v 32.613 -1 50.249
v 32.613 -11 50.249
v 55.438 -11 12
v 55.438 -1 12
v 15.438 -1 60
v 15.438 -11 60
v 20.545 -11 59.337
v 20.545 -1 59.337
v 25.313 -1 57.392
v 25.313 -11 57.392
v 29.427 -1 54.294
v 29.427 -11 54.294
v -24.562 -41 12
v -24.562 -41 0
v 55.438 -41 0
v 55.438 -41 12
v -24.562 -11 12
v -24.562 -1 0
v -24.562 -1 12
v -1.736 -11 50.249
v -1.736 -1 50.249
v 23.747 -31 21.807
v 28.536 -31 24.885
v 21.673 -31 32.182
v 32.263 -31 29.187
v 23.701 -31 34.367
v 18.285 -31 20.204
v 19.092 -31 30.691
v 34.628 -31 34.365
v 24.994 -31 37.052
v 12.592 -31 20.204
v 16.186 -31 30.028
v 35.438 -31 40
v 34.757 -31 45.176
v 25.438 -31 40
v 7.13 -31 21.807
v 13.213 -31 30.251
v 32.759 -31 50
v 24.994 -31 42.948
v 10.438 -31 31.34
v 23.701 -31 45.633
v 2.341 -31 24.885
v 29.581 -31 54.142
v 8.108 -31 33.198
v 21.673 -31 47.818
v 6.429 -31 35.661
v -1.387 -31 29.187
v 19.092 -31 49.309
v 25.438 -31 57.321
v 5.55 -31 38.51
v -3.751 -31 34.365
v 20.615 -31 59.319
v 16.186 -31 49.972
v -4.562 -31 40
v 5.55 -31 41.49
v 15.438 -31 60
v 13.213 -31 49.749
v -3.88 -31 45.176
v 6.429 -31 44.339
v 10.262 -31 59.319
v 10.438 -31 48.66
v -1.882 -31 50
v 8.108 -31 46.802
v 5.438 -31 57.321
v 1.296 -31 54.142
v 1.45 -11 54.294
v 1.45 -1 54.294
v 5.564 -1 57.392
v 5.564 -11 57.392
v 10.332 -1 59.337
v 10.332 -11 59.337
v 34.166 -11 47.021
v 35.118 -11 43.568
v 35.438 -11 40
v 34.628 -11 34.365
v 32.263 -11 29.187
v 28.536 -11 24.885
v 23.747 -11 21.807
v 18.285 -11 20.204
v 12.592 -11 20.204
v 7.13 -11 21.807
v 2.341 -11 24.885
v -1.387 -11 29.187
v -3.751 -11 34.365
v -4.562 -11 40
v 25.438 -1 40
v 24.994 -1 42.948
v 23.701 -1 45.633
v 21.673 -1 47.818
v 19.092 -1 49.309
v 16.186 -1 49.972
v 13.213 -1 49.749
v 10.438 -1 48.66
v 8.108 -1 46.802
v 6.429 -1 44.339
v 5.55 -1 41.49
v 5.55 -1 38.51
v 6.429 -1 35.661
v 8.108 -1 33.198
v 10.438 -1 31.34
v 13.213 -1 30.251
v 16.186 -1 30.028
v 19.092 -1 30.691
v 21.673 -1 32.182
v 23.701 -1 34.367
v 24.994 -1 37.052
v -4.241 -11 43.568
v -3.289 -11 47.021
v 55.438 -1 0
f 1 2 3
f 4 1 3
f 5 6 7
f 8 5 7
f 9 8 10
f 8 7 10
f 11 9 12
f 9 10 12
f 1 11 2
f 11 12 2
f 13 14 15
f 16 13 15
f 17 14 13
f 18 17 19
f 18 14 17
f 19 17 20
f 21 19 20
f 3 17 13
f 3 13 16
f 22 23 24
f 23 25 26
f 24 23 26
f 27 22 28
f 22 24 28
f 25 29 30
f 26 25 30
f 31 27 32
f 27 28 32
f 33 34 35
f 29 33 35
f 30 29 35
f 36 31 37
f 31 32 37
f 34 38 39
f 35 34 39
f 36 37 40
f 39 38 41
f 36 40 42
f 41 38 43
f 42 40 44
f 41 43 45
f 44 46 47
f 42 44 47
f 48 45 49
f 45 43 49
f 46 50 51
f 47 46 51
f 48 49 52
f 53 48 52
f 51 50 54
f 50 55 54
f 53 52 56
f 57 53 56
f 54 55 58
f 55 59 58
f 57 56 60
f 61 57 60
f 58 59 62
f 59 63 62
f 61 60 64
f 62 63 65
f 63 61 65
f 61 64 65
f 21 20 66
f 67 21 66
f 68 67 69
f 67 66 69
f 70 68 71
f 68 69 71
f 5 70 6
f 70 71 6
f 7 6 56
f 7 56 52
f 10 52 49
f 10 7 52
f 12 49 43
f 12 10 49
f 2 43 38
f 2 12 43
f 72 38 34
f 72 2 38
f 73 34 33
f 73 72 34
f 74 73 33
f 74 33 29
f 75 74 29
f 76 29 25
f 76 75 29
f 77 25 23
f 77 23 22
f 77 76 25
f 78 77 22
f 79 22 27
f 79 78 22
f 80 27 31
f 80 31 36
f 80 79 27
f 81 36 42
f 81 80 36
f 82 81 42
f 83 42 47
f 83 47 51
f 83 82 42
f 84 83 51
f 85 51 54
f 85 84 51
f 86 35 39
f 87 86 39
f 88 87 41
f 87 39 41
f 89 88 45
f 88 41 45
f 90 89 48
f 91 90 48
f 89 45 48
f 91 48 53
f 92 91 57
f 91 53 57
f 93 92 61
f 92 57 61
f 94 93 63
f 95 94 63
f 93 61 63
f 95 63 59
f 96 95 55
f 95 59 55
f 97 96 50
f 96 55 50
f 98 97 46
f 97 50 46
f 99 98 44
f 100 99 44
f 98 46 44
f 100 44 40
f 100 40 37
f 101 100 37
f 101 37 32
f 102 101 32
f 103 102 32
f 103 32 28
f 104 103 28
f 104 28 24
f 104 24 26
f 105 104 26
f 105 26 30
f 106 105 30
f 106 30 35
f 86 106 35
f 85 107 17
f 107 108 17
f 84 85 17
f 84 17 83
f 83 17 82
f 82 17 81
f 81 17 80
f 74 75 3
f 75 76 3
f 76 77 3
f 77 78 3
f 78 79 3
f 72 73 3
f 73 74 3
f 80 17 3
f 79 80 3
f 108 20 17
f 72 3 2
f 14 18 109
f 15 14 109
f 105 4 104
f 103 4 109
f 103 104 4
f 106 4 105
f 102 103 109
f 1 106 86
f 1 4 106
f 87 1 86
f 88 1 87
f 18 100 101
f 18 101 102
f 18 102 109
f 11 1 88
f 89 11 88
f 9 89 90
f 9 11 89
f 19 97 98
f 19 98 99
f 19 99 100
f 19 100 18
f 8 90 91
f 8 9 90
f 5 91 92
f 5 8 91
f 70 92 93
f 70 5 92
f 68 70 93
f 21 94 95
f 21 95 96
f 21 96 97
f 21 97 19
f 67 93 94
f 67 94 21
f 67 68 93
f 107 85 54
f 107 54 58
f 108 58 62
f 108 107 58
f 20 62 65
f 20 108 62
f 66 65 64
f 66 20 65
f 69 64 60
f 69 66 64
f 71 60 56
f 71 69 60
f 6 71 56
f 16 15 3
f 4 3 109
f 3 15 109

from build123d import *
from build123d import SkipClean  # not in build123d's __all__

# Parameters (mm, degrees)
F0_W      = 80
F0_H      = 40
F1_DEPTH  = 12
F2_W      = 80
F2_H      = 10
F3_DEPTH  = 48
F6_DEPTH  = 30
F7_R      = 10
F8_DEPTH  = 282
F10_DEPTH = 25


# Not quite as in the source:
# - a feature names something its author has since deleted; it is built from what else it names


with BuildPart() as f1:
    # F0 (on Top) → F1 (new body)
    with BuildSketch(Plane.XY):
        with Locations((15.4384085536, -20.999699384)):
            Rectangle(F0_W, F0_H)
    extrude(amount=F1_DEPTH)

    # F2 (on face) → F3 (join)
    with BuildSketch(Plane.XY.offset(12)):
        with Locations((15.4384085536, -5.999699384)):
            Rectangle(F2_W, F2_H)
    extrude(amount=F3_DEPTH)

    # F5 (on face) → F6 (join)
    with BuildSketch(Plane(origin=(0, -0.999699384, 0), x_dir=(-1, 0, 0), z_dir=(0, 1, 0))):
        with BuildLine():
            ThreePointArc((4.5615914464, 40), (-1.2962728753, 54.1421355692), (-15.4384083992, 60))
            ThreePointArc((-15.4384083992, 60), (-29.5805441228, 54.1421356783), (-35.4384085536, 40))
            Line((-35.4384085536, 40), (-25.4384085536, 40))
            ThreePointArc((-25.4384085536, 40), (-15.4384085536, 50), (-5.4384085536, 40))
            Line((-5.4384085536, 40), (4.5615914464, 40))
        make_face()
        with BuildLine():
            Line((-25.4384085536, 40), (-5.4384085536, 40))
            ThreePointArc((-5.4384085536, 40), (-15.4384085536, 50), (-25.4384085536, 40))
        make_face()
        with BuildLine():
            ThreePointArc((-25.4384085536, 40), (-15.4384085536, 30), (-5.4384085536, 40))
            Line((-5.4384085536, 40), (-25.4384085536, 40))
        make_face()
        with BuildLine():
            ThreePointArc((-35.4384085536, 40), (-15.4384085536, 20), (4.5615914464, 40))
            Line((4.5615914464, 40), (-5.4384085536, 40))
            ThreePointArc((-5.4384085536, 40), (-15.4384085536, 30), (-25.4384085536, 40))
            Line((-25.4384085536, 40), (-35.4384085536, 40))
        make_face()
    extrude(amount=-F6_DEPTH)

    # F7 (on face) → F8 (cut)
    with BuildSketch(Plane.XZ.offset(30.999699384)):
        with Locations((15.4384085536, 40)):
            Circle(F7_R)
    extrude(amount=-F8_DEPTH, mode=Mode.SUBTRACT)

    # F9 (on face) → F10 (cut)
    with BuildSketch(Plane.XZ.offset(10.999699384)):
        Polygon((55.4384085536, 60), (26.7936958102, 60), (32.6127306701, 50.2490321416), (55.4384085536, 12), align=None)
        with BuildLine():
            Line((32.6127306701, 50.2490321416), (26.7936958102, 60))
            Line((26.7936958102, 60), (15.4384085536, 60))
            ThreePointArc((15.4384085536, 60), (25.3131074647, 57.392248889), (32.6127306701, 50.2490321416))
        make_face()
        with BuildLine():
            ThreePointArc((-1.7359137949, 50.2490317528), (5.5637094457, 57.3922487772), (15.4384085536, 60))
            Line((15.4384085536, 60), (4.083121297, 60))
            Line((4.083121297, 60), (-1.7359137949, 50.2490317528))
        make_face()
        Polygon((-1.7359137949, 50.2490317528), (4.083121297, 60), (-24.5615914464, 60), (-24.5615914464, 12), align=None)
    with SkipClean():  # cleaning this boolean's faces spoils the solid; the shape is the same uncleaned
        extrude(amount=-F10_DEPTH, mode=Mode.SUBTRACT)


solid = f1.part
